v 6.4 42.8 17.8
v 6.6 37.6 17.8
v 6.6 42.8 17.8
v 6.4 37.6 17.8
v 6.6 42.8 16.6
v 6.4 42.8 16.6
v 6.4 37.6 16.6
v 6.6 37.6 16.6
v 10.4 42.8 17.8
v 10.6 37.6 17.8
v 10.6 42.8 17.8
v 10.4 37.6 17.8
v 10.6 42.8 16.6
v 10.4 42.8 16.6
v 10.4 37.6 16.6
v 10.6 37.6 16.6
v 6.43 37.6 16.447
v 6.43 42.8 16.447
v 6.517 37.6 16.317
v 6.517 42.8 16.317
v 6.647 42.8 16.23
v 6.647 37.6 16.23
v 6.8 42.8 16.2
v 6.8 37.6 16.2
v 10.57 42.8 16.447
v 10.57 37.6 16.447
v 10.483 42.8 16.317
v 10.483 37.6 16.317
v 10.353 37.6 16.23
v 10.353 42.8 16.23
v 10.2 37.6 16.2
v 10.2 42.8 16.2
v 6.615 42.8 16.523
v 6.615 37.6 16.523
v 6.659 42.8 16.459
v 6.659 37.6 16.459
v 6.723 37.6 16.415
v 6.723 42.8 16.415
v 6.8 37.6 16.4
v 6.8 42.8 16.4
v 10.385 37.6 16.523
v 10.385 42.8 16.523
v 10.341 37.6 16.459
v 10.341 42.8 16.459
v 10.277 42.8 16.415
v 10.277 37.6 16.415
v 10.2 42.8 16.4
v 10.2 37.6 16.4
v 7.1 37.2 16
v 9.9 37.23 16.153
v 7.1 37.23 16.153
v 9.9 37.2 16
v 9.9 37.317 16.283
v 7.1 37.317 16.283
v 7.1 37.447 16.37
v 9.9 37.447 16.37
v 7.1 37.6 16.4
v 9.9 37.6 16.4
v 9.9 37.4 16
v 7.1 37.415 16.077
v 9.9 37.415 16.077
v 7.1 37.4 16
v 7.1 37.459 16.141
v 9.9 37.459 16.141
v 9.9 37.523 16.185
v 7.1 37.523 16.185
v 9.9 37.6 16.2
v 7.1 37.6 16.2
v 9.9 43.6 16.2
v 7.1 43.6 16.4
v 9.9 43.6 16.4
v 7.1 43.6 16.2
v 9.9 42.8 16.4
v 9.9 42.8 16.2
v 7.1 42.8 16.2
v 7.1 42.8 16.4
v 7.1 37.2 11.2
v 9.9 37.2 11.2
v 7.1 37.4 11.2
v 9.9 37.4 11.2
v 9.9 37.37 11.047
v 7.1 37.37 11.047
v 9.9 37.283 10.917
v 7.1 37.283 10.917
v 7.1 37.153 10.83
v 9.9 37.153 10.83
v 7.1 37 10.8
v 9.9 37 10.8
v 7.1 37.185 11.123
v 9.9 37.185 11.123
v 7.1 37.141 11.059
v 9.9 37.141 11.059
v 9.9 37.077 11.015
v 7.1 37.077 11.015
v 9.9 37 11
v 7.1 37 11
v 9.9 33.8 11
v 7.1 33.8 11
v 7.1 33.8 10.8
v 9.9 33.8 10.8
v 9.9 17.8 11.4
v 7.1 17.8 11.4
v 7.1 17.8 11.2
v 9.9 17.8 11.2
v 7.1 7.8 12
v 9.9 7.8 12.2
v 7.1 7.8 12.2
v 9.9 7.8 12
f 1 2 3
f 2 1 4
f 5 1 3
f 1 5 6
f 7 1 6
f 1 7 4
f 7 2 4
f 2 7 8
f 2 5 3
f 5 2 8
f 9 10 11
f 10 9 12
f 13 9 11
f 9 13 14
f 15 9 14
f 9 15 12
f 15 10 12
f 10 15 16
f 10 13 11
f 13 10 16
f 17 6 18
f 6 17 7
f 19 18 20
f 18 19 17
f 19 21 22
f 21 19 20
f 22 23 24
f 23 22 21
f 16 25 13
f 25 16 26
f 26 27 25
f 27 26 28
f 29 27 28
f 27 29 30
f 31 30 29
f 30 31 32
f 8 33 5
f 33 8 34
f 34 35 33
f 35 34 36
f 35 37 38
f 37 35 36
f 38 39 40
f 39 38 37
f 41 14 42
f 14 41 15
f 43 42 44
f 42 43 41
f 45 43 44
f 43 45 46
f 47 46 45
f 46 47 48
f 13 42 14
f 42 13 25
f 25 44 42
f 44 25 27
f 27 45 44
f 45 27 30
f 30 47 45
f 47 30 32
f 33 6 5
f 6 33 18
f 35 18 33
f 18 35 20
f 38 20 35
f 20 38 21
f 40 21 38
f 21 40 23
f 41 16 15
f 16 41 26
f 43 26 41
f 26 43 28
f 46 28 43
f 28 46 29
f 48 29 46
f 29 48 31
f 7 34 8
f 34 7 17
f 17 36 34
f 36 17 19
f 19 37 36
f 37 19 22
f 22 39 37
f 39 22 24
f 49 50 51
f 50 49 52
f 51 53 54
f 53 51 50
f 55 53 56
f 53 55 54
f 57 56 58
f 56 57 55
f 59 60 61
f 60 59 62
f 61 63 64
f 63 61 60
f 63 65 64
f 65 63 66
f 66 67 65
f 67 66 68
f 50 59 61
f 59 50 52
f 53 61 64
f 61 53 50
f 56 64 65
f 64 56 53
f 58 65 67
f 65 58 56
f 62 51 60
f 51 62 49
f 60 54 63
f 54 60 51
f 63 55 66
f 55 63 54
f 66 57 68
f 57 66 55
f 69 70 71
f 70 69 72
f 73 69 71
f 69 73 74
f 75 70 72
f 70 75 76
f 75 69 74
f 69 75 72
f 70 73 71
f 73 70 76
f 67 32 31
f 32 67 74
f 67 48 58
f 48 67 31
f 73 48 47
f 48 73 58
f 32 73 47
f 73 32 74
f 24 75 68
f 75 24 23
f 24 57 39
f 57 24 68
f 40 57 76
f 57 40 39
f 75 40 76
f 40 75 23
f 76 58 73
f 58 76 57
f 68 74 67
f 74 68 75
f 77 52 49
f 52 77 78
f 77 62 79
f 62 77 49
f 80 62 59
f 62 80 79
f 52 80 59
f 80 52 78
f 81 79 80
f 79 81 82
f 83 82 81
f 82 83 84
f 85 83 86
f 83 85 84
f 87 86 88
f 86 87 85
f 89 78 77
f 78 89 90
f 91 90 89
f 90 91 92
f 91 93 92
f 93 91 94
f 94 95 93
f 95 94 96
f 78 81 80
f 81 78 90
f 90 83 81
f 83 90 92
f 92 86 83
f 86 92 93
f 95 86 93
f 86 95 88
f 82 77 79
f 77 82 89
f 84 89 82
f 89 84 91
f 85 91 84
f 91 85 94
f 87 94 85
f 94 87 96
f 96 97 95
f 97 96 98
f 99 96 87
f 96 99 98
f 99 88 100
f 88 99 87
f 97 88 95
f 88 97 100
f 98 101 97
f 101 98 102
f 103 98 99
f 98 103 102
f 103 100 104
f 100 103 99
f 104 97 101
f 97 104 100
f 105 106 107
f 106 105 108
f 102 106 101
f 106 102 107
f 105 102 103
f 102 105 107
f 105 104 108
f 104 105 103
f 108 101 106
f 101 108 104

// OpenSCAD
// file: ../p/1-4edge.scad
use <../lib.scad>
function ldraw_lib__1_4edge() = [
// 0 Circle 0.25
// 0 Name: 1-4edge.dat
// 0 Author: James Jessiman
// 0 !LDRAW_ORG Primitive UPDATE 2017-01
// 0 !LICENSE Licensed under CC BY 4.0 : see CAreadme.txt
// 
// 0 BFC CERTIFY CCW
  [0,"BFC","CERTIFY"],
  [0,"BFC","CCW"],
// 
// 0 !HISTORY 2007-06-22 [PTadmin] Header formatted for Contributor Agreement
// 0 !HISTORY 2008-07-01 [PTadmin] Official Update 2008-01
// 0 !HISTORY 2017-01-15 [Steffen] BFCed
// 0 !HISTORY 2017-12-30 [PTadmin] Official Update 2017-01
// 
// 
// 2 24 1 0 0 0.9239 0 0.3827
  [2,24,1,0,0,0.9239,0,0.3827],
// 2 24 0.9239 0 0.3827 0.7071 0 0.7071
  [2,24,0.9239,0,0.3827,0.7071,0,0.7071],
// 2 24 0.7071 0 0.7071 0.3827 0 0.9239
  [2,24,0.7071,0,0.7071,0.3827,0,0.9239],
// 2 24 0.3827 0 0.9239 0 0 1
  [2,24,0.3827,0,0.9239,0,0,1],
];
module ldraw_lib__1_4edge(step=0, col=false, unit=2/5, alt=false, line=0.2, solid=!$preview)
    makepoly(ldraw_lib__1_4edge(), step=step, col=col, unit=unit, alt=alt, line=line, solid=solid);
ldraw_lib__1_4edge(line=0.2);
// file: ../p/1-4cyli.scad
use <../lib.scad>
function ldraw_lib__1_4cyli() = [
// 0 Cylinder 0.25
// 0 Name: 1-4cyli.dat
// 0 Author: James Jessiman
// 0 !LDRAW_ORG Primitive UPDATE 2012-01
// 0 !LICENSE Licensed under CC BY 4.0 : see CAreadme.txt
// 
// 0 BFC CERTIFY CCW
  [0,"BFC","CERTIFY"],
  [0,"BFC","CCW"],
// 
// 0 !HISTORY 2002-03-23 [sbliss] Added BFC statement.
// 0 !HISTORY 2002-04-25 [PTadmin] Official Update 2002-02
// 0 !HISTORY 2007-06-22 [PTadmin] Header formatted for Contributor Agreement
// 0 !HISTORY 2008-07-01 [PTadmin] Official Update 2008-01
// 0 !HISTORY 2012-02-16 [Philo] Changed to CCW
// 0 !HISTORY 2012-03-30 [PTadmin] Official Update 2012-01
// 
// 
// 4 16 1 1 0 0.9239 1 0.3827 0.9239 0 0.3827 1 0 0
  [4,16,1,1,0,0.9239,1,0.3827,0.9239,0,0.3827,1,0,0],
// 5 24 1 0 0 1 1 0 0.9239 0 0.3827 1 0 -1
  [5,24,1,0,0,1,1,0,0.9239,0,0.3827,1,0,-1],
// 4 16 0.9239 1 0.3827 0.7071 1 0.7071 0.7071 0 0.7071 0.9239 0 0.3827
  [4,16,0.9239,1,0.3827,0.7071,1,0.7071,0.7071,0,0.7071,0.9239,0,0.3827],
// 5 24 0.9239 0 0.3827 0.9239 1 0.3827 0.7071 0 0.7071 1 0 0
  [5,24,0.9239,0,0.3827,0.9239,1,0.3827,0.7071,0,0.7071,1,0,0],
// 4 16 0.7071 1 0.7071 0.3827 1 0.9239 0.3827 0 0.9239 0.7071 0 0.7071
  [4,16,0.7071,1,0.7071,0.3827,1,0.9239,0.3827,0,0.9239,0.7071,0,0.7071],
// 5 24 0.7071 0 0.7071 0.7071 1 0.7071 0.3827 0 0.9239 0.9239 0 0.3827
  [5,24,0.7071,0,0.7071,0.7071,1,0.7071,0.3827,0,0.9239,0.9239,0,0.3827],
// 4 16 0.3827 1 0.9239 0 1 1 0 0 1 0.3827 0 0.9239
  [4,16,0.3827,1,0.9239,0,1,1,0,0,1,0.3827,0,0.9239],
// 5 24 0.3827 0 0.9239 0.3827 1 0.9239 0 0 1 0.7071 0 0.7071
  [5,24,0.3827,0,0.9239,0.3827,1,0.9239,0,0,1,0.7071,0,0.7071],
// 5 24 0 0 1 0 1 1 0.3827 0 0.9239 -1 0 1
  [5,24,0,0,1,0,1,1,0.3827,0,0.9239,-1,0,1],
];
module ldraw_lib__1_4cyli(step=0, col=false, unit=2/5, alt=false, line=0.2, solid=!$preview)
    makepoly(ldraw_lib__1_4cyli(), step=step, col=col, unit=unit, alt=alt, line=line, solid=solid);
ldraw_lib__1_4cyli(line=0.2);
// file: ../p/box5-4a.scad
use <../lib.scad>
function ldraw_lib__box5_4a() = [
// 0 Box with  5 Faces without  4 Adjacent Edges
// 0 Name: box5-4a.dat
// 0 Author: Willy Tschager [Holly-Wood]
// 0 !LDRAW_ORG Primitive UPDATE 2024-01
// 0 !LICENSE Licensed under CC BY 4.0 : see CAreadme.txt
// 
// 0 BFC CERTIFY CCW
  [0,"BFC","CERTIFY"],
  [0,"BFC","CCW"],
// 
// 0 !HISTORY 2009-05-02 [PTadmin] Official Update 2009-01
// 0 !HISTORY 2024-01-03 [Holly-Wood] Complete re-write, original by guyvivan
// 0 !HISTORY 2024-01-29 [OrionP] Official Update 2024-01
// 
// 2 24 -1 1 -1 -1 1 1
  [2,24,-1,1,-1,-1,1,1],
// 2 24 1 1 1 1 1 -1
  [2,24,1,1,1,1,1,-1],
// 2 24 -1 1 1 1 1 1
  [2,24,-1,1,1,1,1,1],
// 2 24 -1 1 -1 1 1 -1
  [2,24,-1,1,-1,1,1,-1],
// 4 16 1 1 1 1 1 -1 -1 1 -1 -1 1 1
  [4,16,1,1,1,1,1,-1,-1,1,-1,-1,1,1],
// 
// 2 24 -1 0 -1 -1 1 -1
  [2,24,-1,0,-1,-1,1,-1],
// 2 24 -1 1 1 -1 0 1
  [2,24,-1,1,1,-1,0,1],
// 4 16 -1 1 1 -1 1 -1 -1 0 -1 -1 0 1
  [4,16,-1,1,1,-1,1,-1,-1,0,-1,-1,0,1],
// 
// 2 24 1 0 -1 1 1 -1
  [2,24,1,0,-1,1,1,-1],
// 2 24 1 1 1 1 0 1
  [2,24,1,1,1,1,0,1],
// 4 16 1 1 -1 1 1 1 1 0 1 1 0 -1
  [4,16,1,1,-1,1,1,1,1,0,1,1,0,-1],
// 
// 4 16 1 1 1 -1 1 1 -1 0 1 1 0 1
  [4,16,1,1,1,-1,1,1,-1,0,1,1,0,1],
// 4 16 -1 1 -1 1 1 -1 1 0 -1 -1 0 -1
  [4,16,-1,1,-1,1,1,-1,1,0,-1,-1,0,-1],
];
module ldraw_lib__box5_4a(step=0, col=false, unit=2/5, alt=false, line=0.2, solid=!$preview)
    makepoly(ldraw_lib__box5_4a(), step=step, col=col, unit=unit, alt=alt, line=line, solid=solid);
ldraw_lib__box5_4a(line=0.2);
// file: ../p/box5-2p.scad
use <../lib.scad>
function ldraw_lib__box5_2p() = [
// 0 Box with  5 Faces without  2 Parallel Edges
// 0 Name: box5-2p.dat
// 0 Author: Willy Tschager [Holly-Wood]
// 0 !LDRAW_ORG Primitive UPDATE 2024-01
// 0 !LICENSE Licensed under CC BY 4.0 : see CAreadme.txt
// 
// 0 BFC CERTIFY CCW
  [0,"BFC","CERTIFY"],
  [0,"BFC","CCW"],
// 
// 0 !HISTORY 2012-03-30 [PTadmin] Official Update 2012-01
// 0 !HISTORY 2024-01-04 [Holly-Wood] Complete re-write, original by Brickaneer
// 0 !HISTORY 2024-01-29 [OrionP] Official Update 2024-01
// 
// 2 24 -1 1 1 1 1 1
  [2,24,-1,1,1,1,1,1],
// 2 24 -1 1 -1 -1 1 1
  [2,24,-1,1,-1,-1,1,1],
// 2 24 1 1 -1 -1 1 -1
  [2,24,1,1,-1,-1,1,-1],
// 2 24 1 1 1 1 1 -1
  [2,24,1,1,1,1,1,-1],
// 4 16 1 1 1 1 1 -1 -1 1 -1 -1 1 1
  [4,16,1,1,1,1,1,-1,-1,1,-1,-1,1,1],
// 
// 2 24 -1 1 1 -1 0 1
  [2,24,-1,1,1,-1,0,1],
// 2 24 -1 1 -1 -1 0 -1
  [2,24,-1,1,-1,-1,0,-1],
// 2 24 -1 0 -1 -1 0 1
  [2,24,-1,0,-1,-1,0,1],
// 4 16 -1 1 1 -1 1 -1 -1 0 -1 -1 0 1
  [4,16,-1,1,1,-1,1,-1,-1,0,-1,-1,0,1],
// 
// 2 24 1 1 1 1 0 1
  [2,24,1,1,1,1,0,1],
// 2 24 1 1 -1 1 0 -1
  [2,24,1,1,-1,1,0,-1],
// 2 24 1 0 1 1 0 -1
  [2,24,1,0,1,1,0,-1],
// 4 16 1 1 -1 1 1 1 1 0 1 1 0 -1
  [4,16,1,1,-1,1,1,1,1,0,1,1,0,-1],
// 
// 4 16 1 1 1 -1 1 1 -1 0 1 1 0 1
  [4,16,1,1,1,-1,1,1,-1,0,1,1,0,1],
// 4 16 -1 1 -1 1 1 -1 1 0 -1 -1 0 -1
  [4,16,-1,1,-1,1,1,-1,1,0,-1,-1,0,-1],
];
module ldraw_lib__box5_2p(step=0, col=false, unit=2/5, alt=false, line=0.2, solid=!$preview)
    makepoly(ldraw_lib__box5_2p(), step=step, col=col, unit=unit, alt=alt, line=line, solid=solid);
ldraw_lib__box5_2p(line=0.2);
// file: ../p/box4o8a.scad
use <../lib.scad>
function ldraw_lib__box4o8a() = [
// 0 Box with 4 Faces (2 Parallel Pairs) without Top and Bottom Edges
// 0 Name: box4o8a.dat
// 0 Author: Steffen [Steffen]
// 0 !LDRAW_ORG Primitive UPDATE 2012-01
// 0 !LICENSE Licensed under CC BY 4.0 : see CAreadme.txt
// 
// 0 BFC CERTIFY CCW
  [0,"BFC","CERTIFY"],
  [0,"BFC","CCW"],
// 
// 0 !HISTORY 2004-04-22 [PTadmin] Official Update 2004-02
// 0 !HISTORY 2007-06-24 [PTadmin] Header formatted for Contributor Agreement
// 0 !HISTORY 2008-07-01 [PTadmin] Official Update 2008-01
// 0 !HISTORY 2012-02-16 [Philo] Changed to CCW
// 0 !HISTORY 2012-03-30 [PTadmin] Official Update 2012-01
// 
// 
// 2 24 1 0 1 1 1 1
  [2,24,1,0,1,1,1,1],
// 2 24 -1 0 1 -1 1 1
  [2,24,-1,0,1,-1,1,1],
// 2 24 1 0 -1 1 1 -1
  [2,24,1,0,-1,1,1,-1],
// 2 24 -1 0 -1 -1 1 -1
  [2,24,-1,0,-1,-1,1,-1],
// 4 16 -1 1 1 -1 0 1 1 0 1 1 1 1
  [4,16,-1,1,1,-1,0,1,1,0,1,1,1,1],
// 4 16 -1 1 -1 -1 0 -1 -1 0 1 -1 1 1
  [4,16,-1,1,-1,-1,0,-1,-1,0,1,-1,1,1],
// 4 16 1 1 -1 1 0 -1 -1 0 -1 -1 1 -1
  [4,16,1,1,-1,1,0,-1,-1,0,-1,-1,1,-1],
// 4 16 1 1 1 1 0 1 1 0 -1 1 1 -1
  [4,16,1,1,1,1,0,1,1,0,-1,1,1,-1],
];
module ldraw_lib__box4o8a(step=0, col=false, unit=2/5, alt=false, line=0.2, solid=!$preview)
    makepoly(ldraw_lib__box4o8a(), step=step, col=col, unit=unit, alt=alt, line=line, solid=solid);
ldraw_lib__box4o8a(line=0.2);
// file: ../p/1-4ring1.scad
use <../lib.scad>
function ldraw_lib__1_4ring1() = [
// 0 Ring  1 x 0.25
// 0 Name: 1-4ring1.dat
// 0 Author: Chris Dee [cwdee]
// 0 !LDRAW_ORG Primitive UPDATE 2012-01
// 0 !LICENSE Licensed under CC BY 4.0 : see CAreadme.txt
// 
// 0 BFC CERTIFY CCW
  [0,"BFC","CERTIFY"],
  [0,"BFC","CCW"],
// 
// 0 !HISTORY 2000-05-07 [PTadmin] Official Update 2000-01
// 0 !HISTORY 2002-11-22 [hafhead] Added BFC statement
// 0 !HISTORY 2002-11-30 [PTadmin] Official Update 2002-05
// 0 !HISTORY 2007-06-22 [PTadmin] Header formatted for Contributor Agreement
// 0 !HISTORY 2008-07-01 [PTadmin] Official Update 2008-01
// 0 !HISTORY 2012-02-16 [Philo] Changed to CCW
// 0 !HISTORY 2012-03-30 [PTadmin] Official Update 2012-01
// 
// 
// 4 16 2 0 0 1.8478 0 0.7654 0.9239 0 0.3827 1 0 0
  [4,16,2,0,0,1.8478,0,0.7654,0.9239,0,0.3827,1,0,0],
// 4 16 1.8478 0 0.7654 1.4142 0 1.4142 0.7071 0 0.7071 0.9239 0 0.3827
  [4,16,1.8478,0,0.7654,1.4142,0,1.4142,0.7071,0,0.7071,0.9239,0,0.3827],
// 4 16 1.4142 0 1.4142 0.7654 0 1.8478 0.3827 0 0.9239 0.7071 0 0.7071
  [4,16,1.4142,0,1.4142,0.7654,0,1.8478,0.3827,0,0.9239,0.7071,0,0.7071],
// 4 16 0.7654 0 1.8478 0 0 2 0 0 1 0.3827 0 0.9239
  [4,16,0.7654,0,1.8478,0,0,2,0,0,1,0.3827,0,0.9239],
];
module ldraw_lib__1_4ring1(step=0, col=false, unit=2/5, alt=false, line=0.2, solid=!$preview)
    makepoly(ldraw_lib__1_4ring1(), step=step, col=col, unit=unit, alt=alt, line=line, solid=solid);
ldraw_lib__1_4ring1(line=0.2);
// file: ../p/1-4cylo.scad
use <../lib.scad>
use <1-4cyli.scad>
use <1-4edge.scad>
function ldraw_lib__1_4cylo() = [
// 0 Cylinder Open 0.25
// 0 Name: 1-4cylo.dat
// 0 Author: Max Martin Richter [MMR1988]
// 0 !LDRAW_ORG Primitive UPDATE 2010-03
// 0 !LICENSE Licensed under CC BY 4.0 : see CAreadme.txt
// 
// 0 BFC CERTIFY CCW
  [0,"BFC","CERTIFY"],
  [0,"BFC","CCW"],
// 
// 0 !HISTORY 2010-12-31 [PTadmin] Official Update 2010-03
// 
// 
// 1 16 0 0 0 1 0 0 0 1 0 0 0 1 1-4edge.dat
  [1,16,0,0,0,1,0,0,0,1,0,0,0,1, ldraw_lib__1_4edge()],
// 1 16 0 1 0 1 0 0 0 1 0 0 0 1 1-4edge.dat
  [1,16,0,1,0,1,0,0,0,1,0,0,0,1, ldraw_lib__1_4edge()],
// 1 16 0 0 0 1 0 0 0 1 0 0 0 1 1-4cyli.dat
  [1,16,0,0,0,1,0,0,0,1,0,0,0,1, ldraw_lib__1_4cyli()],
];
module ldraw_lib__1_4cylo(step=0, col=false, unit=2/5, alt=false, line=0.2, solid=!$preview)
    makepoly(ldraw_lib__1_4cylo(), step=step, col=col, unit=unit, alt=alt, line=line, solid=solid);
ldraw_lib__1_4cylo(line=0.2);
// main file
use <../lib.scad>
use <../p/1-4cylo.scad>
use <../p/1-4ring1.scad>
use <../p/box4o8a.scad>
use <../p/box5-2p.scad>
use <../p/box5-4a.scad>
function ldraw_lib__u9574_f1() = [
// 0 ~Electric 9V Battery Box  4 x 14 x  4 - Buttons - Contact, Button Released Position
// 0 Name: u9574-f1.dat
// 0 Author: Gerald Lasser [GeraldLasser]
// 0 !LDRAW_ORG Part UPDATE 2024-08
// 0 !LICENSE Licensed under CC BY 4.0 : see CAreadme.txt
// 
// 0 BFC CERTIFY CCW
  [0,"BFC","CERTIFY"],
  [0,"BFC","CCW"],
// 
// 0 !HISTORY 2024-09-30 [OrionP] Official Update 2024-08
// 
// 1 16 16.25 -41.5 100.5 .25 0 0 0 -3 0 0 0 6.5 box5-4a.dat
  [1,16,16.25,-41.5,100.5,.25,0,0,0,-3,0,0,0,6.5, ldraw_lib__box5_4a()],
// 1 16 26.25 -41.5 100.5 .25 0 0 0 -3 0 0 0 6.5 box5-4a.dat
  [1,16,26.25,-41.5,100.5,.25,0,0,0,-3,0,0,0,6.5, ldraw_lib__box5_4a()],
// 1 16 17 -41.5 107 -1 0 0 0 0 1 0 -13 0 1-4cylo.dat
  [1,16,17,-41.5,107,-1,0,0,0,0,1,0,-13,0, ldraw_lib__1_4cylo()],
// 1 16 25.5 -41.5 107 1 0 0 0 0 1 0 -13 0 1-4cylo.dat
  [1,16,25.5,-41.5,107,1,0,0,0,0,1,0,-13,0, ldraw_lib__1_4cylo()],
// 0 BFC INVERTNEXT
  [0,"BFC","INVERTNEXT"],
// 1 16 17 -41.5 107 -.5 0 0 0 0 .5 0 -13 0 1-4cylo.dat
  [1,16,17,-41.5,107,-.5,0,0,0,0,.5,0,-13,0, ldraw_lib__1_4cylo()],
// 0 BFC INVERTNEXT
  [0,"BFC","INVERTNEXT"],
// 1 16 25.5 -41.5 107 .5 0 0 0 0 .5 0 -13 0 1-4cylo.dat
  [1,16,25.5,-41.5,107,.5,0,0,0,0,.5,0,-13,0, ldraw_lib__1_4cylo()],
// 1 16 25.5 -41.5 107 .5 0 0 0 0 .5 0 -1 0 1-4ring1.dat
  [1,16,25.5,-41.5,107,.5,0,0,0,0,.5,0,-1,0, ldraw_lib__1_4ring1()],
// 1 16 17 -41.5 107 -.5 0 0 0 0 .5 0 -1 0 1-4ring1.dat
  [1,16,17,-41.5,107,-.5,0,0,0,0,.5,0,-1,0, ldraw_lib__1_4ring1()],
// 1 16 25.5 -41.5 94 .5 0 0 0 0 .5 0 1 0 1-4ring1.dat
  [1,16,25.5,-41.5,94,.5,0,0,0,0,.5,0,1,0, ldraw_lib__1_4ring1()],
// 1 16 17 -41.5 94 -.5 0 0 0 0 .5 0 1 0 1-4ring1.dat
  [1,16,17,-41.5,94,-.5,0,0,0,0,.5,0,1,0, ldraw_lib__1_4ring1()],
// 
// 1 16 24.75 -40 94 0 -7 0 0 0 -1 -1 0 0 1-4cylo.dat
  [1,16,24.75,-40,94,0,-7,0,0,0,-1,-1,0,0, ldraw_lib__1_4cylo()],
// 0 BFC INVERTNEXT
  [0,"BFC","INVERTNEXT"],
// 1 16 24.75 -40 94 0 -7 0 0 0 -.5 -.5 0 0 1-4cylo.dat
  [1,16,24.75,-40,94,0,-7,0,0,0,-.5,-.5,0,0, ldraw_lib__1_4cylo()],
// 1 16 24.75 -40 94 0 -1 0 0 0 -.5 -.5 0 0 1-4ring1.dat
  [1,16,24.75,-40,94,0,-1,0,0,0,-.5,-.5,0,0, ldraw_lib__1_4ring1()],
// 1 16 17.75 -40 94 0 1 0 0 0 -.5 -.5 0 0 1-4ring1.dat
  [1,16,17.75,-40,94,0,1,0,0,0,-.5,-.5,0,0, ldraw_lib__1_4ring1()],
// 2 24 24.75 -41 94 24.75 -40.5 94
  [2,24,24.75,-41,94,24.75,-40.5,94],
// 2 24 17.75 -41 94 17.75 -40.5 94
  [2,24,17.75,-41,94,17.75,-40.5,94],
// 1 16 21.25 -40.75 107 -3.5 0 0 0 0 .25 0 2 0 box5-2p.dat
  [1,16,21.25,-40.75,107,-3.5,0,0,0,0,.25,0,2,0, ldraw_lib__box5_2p()],
// 1 16 24.75 -40.75 100.5 0 .75 0 0 0 .25 6.5 0 0 box4o8a.dat
  [1,16,24.75,-40.75,100.5,0,.75,0,0,0,.25,6.5,0,0, ldraw_lib__box4o8a()],
// 1 16 17 -40.75 100.5 0 .75 0 0 0 .25 6.5 0 0 box4o8a.dat
  [1,16,17,-40.75,100.5,0,.75,0,0,0,.25,6.5,0,0, ldraw_lib__box4o8a()],
// 4 16 17.75 -41 107 17.75 -41 94 24.75 -41 94 24.75 -41 107
  [4,16,17.75,-41,107,17.75,-41,94,24.75,-41,94,24.75,-41,107],
// 4 16 17.75 -40.5 94 17.75 -40.5 107 24.75 -40.5 107 24.75 -40.5 94
  [4,16,17.75,-40.5,94,17.75,-40.5,107,24.75,-40.5,107,24.75,-40.5,94],
// 1 16 21.25 -40 93.25 3.5 0 0 0 12 0 0 0 -.25 box4o8a.dat
  [1,16,21.25,-40,93.25,3.5,0,0,0,12,0,0,0,-.25, ldraw_lib__box4o8a()],
// 1 16 24.75 -28 92.5 0 -7 0 0 0 1 1 0 0 1-4cylo.dat
  [1,16,24.75,-28,92.5,0,-7,0,0,0,1,1,0,0, ldraw_lib__1_4cylo()],
// 0 BFC INVERTNEXT
  [0,"BFC","INVERTNEXT"],
// 1 16 24.75 -28 92.5 0 -7 0 0 0 .5 .5 0 0 1-4cylo.dat
  [1,16,24.75,-28,92.5,0,-7,0,0,0,.5,.5,0,0, ldraw_lib__1_4cylo()],
// 1 16 24.75 -28 92.5 0 -1 0 0 0 .5 .5 0 0 1-4ring1.dat
  [1,16,24.75,-28,92.5,0,-1,0,0,0,.5,.5,0,0, ldraw_lib__1_4ring1()],
// 1 16 17.75 -28 92.5 0 1 0 0 0 .5 .5 0 0 1-4ring1.dat
  [1,16,17.75,-28,92.5,0,1,0,0,0,.5,.5,0,0, ldraw_lib__1_4ring1()],
// 1 16 21.25 -27.25 92.5 3.5 0 0 0 0 -.25 0 -8 0 box4o8a.dat
  [1,16,21.25,-27.25,92.5,3.5,0,0,0,0,-.25,0,-8,0, ldraw_lib__box4o8a()],
// 1 16 21.25 -27.25 84.5 3.5 0 0 0 -1 -.25 0 -40 0 box4o8a.dat
  [1,16,21.25,-27.25,84.5,3.5,0,0,0,-1,-.25,0,-40,0, ldraw_lib__box4o8a()],
// 1 16 21.25 -28.25 44.5 3.5 0 0 0 -2 -.25 0 -25 0 box5-4a.dat
  [1,16,21.25,-28.25,44.5,3.5,0,0,0,-2,-.25,0,-25,0, ldraw_lib__box5_4a()],
// 
// 5 24 17.75 -27 84.5 24.75 -27 84.5 24.75 -27 92.5 17.75 -28 44.5
  [5,24,17.75,-27,84.5,24.75,-27,84.5,24.75,-27,92.5,17.75,-28,44.5],
// 5 24 24.75 -28.5 44.5 17.75 -28.5 44.5 24.75 -30.5 19.5 17.75 -27.5 84.5
  [5,24,24.75,-28.5,44.5,17.75,-28.5,44.5,24.75,-30.5,19.5,17.75,-27.5,84.5],
// 5 24 24.75 -27.5 84.5 17.75 -27.5 84.5 17.75 -27.5 92.5 24.75 -28.5 44.5
  [5,24,24.75,-27.5,84.5,17.75,-27.5,84.5,17.75,-27.5,92.5,24.75,-28.5,44.5],
// 5 24 17.75 -28 44.5 24.75 -28 44.5 24.75 -27 84.5 17.75 -30 19.5
  [5,24,17.75,-28,44.5,24.75,-28,44.5,24.75,-27,84.5,17.75,-30,19.5],
];
module ldraw_lib__u9574_f1(step=0, col=false, unit=2/5, alt=false, line=0.2, solid=!$preview)
    makepoly(ldraw_lib__u9574_f1(), step=step, col=col, unit=unit, alt=alt, line=line, solid=solid);
ldraw_lib__u9574_f1(line=0.2);
